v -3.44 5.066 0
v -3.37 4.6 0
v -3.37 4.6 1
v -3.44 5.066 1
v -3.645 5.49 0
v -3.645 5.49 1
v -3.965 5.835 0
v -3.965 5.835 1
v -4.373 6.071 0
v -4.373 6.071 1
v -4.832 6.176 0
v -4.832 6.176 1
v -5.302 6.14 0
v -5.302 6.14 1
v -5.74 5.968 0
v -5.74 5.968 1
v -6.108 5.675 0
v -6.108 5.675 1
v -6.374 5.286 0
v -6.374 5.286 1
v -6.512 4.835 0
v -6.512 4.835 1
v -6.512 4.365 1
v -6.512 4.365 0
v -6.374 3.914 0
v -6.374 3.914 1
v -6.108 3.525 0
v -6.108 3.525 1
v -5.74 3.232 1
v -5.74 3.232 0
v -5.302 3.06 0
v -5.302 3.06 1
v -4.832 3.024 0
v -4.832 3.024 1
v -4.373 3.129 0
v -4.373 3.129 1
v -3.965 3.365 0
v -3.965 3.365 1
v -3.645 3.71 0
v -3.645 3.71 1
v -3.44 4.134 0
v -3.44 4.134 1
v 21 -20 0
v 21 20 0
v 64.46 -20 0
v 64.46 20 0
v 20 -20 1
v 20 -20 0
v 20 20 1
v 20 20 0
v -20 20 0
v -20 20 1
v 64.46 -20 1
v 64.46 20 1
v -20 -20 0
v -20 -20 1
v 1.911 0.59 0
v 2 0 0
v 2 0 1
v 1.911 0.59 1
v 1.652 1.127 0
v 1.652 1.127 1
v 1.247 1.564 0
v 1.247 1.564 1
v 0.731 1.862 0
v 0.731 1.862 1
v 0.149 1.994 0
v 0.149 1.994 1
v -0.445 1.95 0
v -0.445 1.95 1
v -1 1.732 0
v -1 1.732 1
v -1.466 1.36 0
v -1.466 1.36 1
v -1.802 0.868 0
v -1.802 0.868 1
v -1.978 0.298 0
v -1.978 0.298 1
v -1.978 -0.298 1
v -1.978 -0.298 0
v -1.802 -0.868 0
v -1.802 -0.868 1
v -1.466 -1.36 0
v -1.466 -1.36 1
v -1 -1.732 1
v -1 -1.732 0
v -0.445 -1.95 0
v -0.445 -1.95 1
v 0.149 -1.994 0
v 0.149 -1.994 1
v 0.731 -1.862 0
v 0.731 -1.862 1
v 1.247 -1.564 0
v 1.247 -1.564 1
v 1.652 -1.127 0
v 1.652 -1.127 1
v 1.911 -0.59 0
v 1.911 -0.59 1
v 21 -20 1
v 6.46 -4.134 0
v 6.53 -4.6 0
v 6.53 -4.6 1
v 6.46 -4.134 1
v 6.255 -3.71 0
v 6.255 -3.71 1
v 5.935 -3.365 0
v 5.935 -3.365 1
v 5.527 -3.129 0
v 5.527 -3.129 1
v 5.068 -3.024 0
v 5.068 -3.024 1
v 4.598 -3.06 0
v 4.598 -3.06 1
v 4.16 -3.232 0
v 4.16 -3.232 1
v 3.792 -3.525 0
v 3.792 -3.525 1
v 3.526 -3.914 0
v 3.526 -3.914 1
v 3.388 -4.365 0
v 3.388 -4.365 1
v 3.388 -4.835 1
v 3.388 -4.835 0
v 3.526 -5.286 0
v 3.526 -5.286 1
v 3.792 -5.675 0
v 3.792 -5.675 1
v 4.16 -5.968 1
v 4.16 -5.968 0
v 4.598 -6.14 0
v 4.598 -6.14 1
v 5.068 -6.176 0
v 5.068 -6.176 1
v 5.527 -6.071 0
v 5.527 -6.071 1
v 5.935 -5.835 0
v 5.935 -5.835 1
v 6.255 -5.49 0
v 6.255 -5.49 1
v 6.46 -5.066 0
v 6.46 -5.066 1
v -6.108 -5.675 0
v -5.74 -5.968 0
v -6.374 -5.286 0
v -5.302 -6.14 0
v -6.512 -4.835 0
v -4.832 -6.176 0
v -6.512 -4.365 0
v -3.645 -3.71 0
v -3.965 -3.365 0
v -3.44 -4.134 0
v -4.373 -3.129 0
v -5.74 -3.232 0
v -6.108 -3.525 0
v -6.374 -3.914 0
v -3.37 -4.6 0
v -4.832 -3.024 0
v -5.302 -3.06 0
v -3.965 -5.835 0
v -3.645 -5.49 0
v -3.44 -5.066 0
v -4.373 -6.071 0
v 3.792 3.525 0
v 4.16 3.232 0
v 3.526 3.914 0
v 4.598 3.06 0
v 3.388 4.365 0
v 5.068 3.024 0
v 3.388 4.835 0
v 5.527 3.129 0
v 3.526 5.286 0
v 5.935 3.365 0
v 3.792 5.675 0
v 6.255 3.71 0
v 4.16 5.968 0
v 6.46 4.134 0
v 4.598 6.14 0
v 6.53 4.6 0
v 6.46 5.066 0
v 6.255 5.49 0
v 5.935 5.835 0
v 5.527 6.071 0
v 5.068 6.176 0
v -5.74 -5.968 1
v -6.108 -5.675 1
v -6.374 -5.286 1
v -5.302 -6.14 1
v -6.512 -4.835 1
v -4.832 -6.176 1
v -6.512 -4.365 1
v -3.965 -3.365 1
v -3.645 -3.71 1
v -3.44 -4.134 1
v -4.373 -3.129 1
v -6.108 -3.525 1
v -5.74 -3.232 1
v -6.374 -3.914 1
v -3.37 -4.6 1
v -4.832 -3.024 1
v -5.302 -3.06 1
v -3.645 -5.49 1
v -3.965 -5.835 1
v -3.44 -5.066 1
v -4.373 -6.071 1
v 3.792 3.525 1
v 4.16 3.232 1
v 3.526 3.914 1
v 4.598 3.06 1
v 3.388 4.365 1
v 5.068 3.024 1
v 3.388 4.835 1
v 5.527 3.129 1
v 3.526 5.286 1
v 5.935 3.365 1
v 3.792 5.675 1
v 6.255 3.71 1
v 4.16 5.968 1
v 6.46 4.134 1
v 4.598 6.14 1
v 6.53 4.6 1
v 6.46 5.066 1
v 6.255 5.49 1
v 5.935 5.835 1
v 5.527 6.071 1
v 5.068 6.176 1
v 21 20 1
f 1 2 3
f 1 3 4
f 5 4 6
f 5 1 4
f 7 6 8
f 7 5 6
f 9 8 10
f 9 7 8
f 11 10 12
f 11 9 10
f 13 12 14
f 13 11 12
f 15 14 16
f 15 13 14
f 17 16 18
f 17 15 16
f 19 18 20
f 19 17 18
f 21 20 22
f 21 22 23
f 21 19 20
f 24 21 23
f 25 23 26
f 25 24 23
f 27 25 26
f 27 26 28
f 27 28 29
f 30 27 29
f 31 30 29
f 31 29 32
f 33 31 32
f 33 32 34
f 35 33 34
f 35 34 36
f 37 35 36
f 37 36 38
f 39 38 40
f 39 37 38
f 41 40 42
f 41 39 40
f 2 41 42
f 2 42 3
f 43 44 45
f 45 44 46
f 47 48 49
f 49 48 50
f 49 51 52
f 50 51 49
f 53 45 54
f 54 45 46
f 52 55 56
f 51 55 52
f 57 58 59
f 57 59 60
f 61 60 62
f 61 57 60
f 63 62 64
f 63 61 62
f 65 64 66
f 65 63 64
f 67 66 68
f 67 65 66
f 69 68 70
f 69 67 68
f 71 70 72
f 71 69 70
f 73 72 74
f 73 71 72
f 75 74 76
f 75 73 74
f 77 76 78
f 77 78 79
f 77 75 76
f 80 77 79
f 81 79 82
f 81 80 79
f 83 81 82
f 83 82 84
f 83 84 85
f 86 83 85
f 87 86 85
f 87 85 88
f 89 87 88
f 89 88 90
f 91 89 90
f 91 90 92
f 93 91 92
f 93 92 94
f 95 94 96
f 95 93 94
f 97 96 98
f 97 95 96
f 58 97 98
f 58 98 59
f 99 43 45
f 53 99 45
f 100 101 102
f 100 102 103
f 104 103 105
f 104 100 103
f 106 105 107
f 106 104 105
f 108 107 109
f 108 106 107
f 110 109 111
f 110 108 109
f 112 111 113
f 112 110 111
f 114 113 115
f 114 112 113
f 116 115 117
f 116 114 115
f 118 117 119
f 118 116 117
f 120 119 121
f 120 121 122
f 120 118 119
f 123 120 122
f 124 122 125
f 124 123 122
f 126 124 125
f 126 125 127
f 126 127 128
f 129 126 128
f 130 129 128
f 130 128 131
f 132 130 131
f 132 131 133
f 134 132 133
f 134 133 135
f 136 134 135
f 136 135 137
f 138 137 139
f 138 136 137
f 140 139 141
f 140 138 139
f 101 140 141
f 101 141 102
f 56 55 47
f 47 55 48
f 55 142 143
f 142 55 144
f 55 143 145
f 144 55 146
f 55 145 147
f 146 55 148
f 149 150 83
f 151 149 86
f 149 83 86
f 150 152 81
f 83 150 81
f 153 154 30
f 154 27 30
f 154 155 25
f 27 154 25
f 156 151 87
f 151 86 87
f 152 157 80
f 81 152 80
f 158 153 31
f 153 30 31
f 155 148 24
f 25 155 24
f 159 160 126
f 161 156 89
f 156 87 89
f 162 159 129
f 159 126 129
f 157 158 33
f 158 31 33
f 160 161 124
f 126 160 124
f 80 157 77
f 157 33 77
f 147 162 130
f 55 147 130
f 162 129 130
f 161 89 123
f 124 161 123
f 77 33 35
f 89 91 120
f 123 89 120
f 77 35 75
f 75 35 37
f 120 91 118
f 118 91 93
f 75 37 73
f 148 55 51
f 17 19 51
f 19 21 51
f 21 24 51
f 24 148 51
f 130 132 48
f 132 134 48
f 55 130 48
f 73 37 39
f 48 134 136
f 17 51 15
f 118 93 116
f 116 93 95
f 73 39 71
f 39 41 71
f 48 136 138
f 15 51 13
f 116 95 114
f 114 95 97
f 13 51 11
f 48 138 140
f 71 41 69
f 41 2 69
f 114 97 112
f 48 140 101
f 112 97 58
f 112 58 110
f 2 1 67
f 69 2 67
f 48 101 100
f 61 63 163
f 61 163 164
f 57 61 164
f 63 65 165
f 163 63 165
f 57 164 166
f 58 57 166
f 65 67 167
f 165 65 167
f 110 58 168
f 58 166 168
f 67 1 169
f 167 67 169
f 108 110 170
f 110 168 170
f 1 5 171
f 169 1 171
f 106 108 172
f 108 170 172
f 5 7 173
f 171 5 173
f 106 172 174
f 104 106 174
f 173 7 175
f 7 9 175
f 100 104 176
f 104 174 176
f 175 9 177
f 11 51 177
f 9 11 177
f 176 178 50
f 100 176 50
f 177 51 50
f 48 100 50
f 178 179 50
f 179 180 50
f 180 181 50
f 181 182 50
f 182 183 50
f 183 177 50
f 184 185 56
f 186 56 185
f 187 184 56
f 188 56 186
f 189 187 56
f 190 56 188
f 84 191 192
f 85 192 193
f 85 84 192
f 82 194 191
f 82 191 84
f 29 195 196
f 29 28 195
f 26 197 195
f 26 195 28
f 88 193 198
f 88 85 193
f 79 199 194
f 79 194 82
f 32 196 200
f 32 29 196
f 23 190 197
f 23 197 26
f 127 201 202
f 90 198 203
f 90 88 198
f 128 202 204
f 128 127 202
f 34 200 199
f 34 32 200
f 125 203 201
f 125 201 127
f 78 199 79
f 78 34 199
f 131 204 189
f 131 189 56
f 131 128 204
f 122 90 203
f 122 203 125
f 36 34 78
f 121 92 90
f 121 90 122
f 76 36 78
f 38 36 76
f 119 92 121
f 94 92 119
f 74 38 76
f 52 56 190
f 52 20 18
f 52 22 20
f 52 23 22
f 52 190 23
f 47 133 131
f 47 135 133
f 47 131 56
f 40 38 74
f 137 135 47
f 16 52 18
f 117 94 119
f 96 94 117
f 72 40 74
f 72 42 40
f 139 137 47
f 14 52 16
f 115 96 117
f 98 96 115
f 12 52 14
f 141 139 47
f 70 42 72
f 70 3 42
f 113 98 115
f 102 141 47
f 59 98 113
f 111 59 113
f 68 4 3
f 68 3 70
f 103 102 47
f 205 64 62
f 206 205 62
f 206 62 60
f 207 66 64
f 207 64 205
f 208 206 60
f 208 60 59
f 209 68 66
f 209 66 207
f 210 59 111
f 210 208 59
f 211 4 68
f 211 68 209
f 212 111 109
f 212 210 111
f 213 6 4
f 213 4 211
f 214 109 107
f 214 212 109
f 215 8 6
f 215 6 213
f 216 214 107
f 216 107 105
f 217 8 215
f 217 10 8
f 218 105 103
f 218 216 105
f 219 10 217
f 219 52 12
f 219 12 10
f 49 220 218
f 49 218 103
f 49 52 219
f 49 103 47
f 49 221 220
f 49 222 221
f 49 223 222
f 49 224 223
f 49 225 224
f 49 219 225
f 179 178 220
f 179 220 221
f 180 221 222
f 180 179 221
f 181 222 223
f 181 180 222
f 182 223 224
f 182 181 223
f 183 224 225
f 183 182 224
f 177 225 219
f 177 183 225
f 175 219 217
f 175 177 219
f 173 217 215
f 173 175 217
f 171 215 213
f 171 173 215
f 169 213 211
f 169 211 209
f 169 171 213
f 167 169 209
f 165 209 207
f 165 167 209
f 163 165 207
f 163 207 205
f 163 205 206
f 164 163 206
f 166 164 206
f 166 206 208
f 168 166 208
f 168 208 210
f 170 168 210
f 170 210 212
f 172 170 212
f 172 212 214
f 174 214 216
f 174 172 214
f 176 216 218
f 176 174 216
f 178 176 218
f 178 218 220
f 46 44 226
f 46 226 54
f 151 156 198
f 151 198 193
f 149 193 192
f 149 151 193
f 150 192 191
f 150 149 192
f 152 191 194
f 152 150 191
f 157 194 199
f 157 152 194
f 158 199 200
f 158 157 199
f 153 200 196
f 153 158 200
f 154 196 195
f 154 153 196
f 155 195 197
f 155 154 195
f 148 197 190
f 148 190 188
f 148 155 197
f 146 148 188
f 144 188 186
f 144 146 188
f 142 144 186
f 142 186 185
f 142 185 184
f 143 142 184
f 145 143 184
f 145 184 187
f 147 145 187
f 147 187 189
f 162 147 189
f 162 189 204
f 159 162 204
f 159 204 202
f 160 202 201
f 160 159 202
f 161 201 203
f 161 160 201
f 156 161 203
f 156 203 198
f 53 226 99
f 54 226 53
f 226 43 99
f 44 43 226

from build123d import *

# Parameters (mm, degrees)
BOX001_W          = 43.46
BOX001_H          = 40
BOX001_DEPTH      = 1
CYLINDER004_R     = 2
CYLINDER004_DEPTH = 1
CYLINDER003_R     = 1.58
CYLINDER003_DEPTH = 1
CYLINDER_R        = 1.58
CYLINDER_DEPTH    = 1
CYLINDER001_R     = 1.58
CYLINDER001_DEPTH = 1
CYLINDER002_R     = 1.58
CYLINDER002_DEPTH = 1
BOX_W             = 40
BOX_H             = 40
BOX_DEPTH         = 1


with BuildPart() as cube001:
    # Box001 → Box001 (new body)
    with BuildSketch(Plane(origin=(21, -20, 0), x_dir=(1, 0, 0), z_dir=(0, 0, 1))):
        with Locations((21.73, 20)):
            Rectangle(BOX001_W, BOX001_H)
    extrude(amount=BOX001_DEPTH)


with BuildPart() as cylinder004:
    # Cylinder004 → Cylinder004 (new body)
    with BuildSketch(Plane.XY):
        Circle(CYLINDER004_R)
    extrude(amount=CYLINDER004_DEPTH)


with BuildPart() as cylinder003:
    # Cylinder003 → Cylinder003 (new body)
    with BuildSketch(Plane(origin=(4.95, -4.6, 0), x_dir=(1, 0, 0), z_dir=(0, 0, 1))):
        Circle(CYLINDER003_R)
    extrude(amount=CYLINDER003_DEPTH)


with BuildPart() as cylinder:
    # Cylinder → Cylinder (new body)
    with BuildSketch(Plane(origin=(-4.95, -4.6, 0), x_dir=(1, 0, 0), z_dir=(0, 0, 1))):
        Circle(CYLINDER_R)
    extrude(amount=CYLINDER_DEPTH)


with BuildPart() as cylinder001:
    # Cylinder001 → Cylinder001 (new body)
    with BuildSketch(Plane(origin=(-4.95, 4.6, 0), x_dir=(1, 0, 0), z_dir=(0, 0, 1))):
        Circle(CYLINDER001_R)
    extrude(amount=CYLINDER001_DEPTH)


with BuildPart() as cylinder002:
    # Cylinder002 → Cylinder002 (new body)
    with BuildSketch(Plane(origin=(4.95, 4.6, 0), x_dir=(1, 0, 0), z_dir=(0, 0, 1))):
        Circle(CYLINDER002_R)
    extrude(amount=CYLINDER002_DEPTH)


with BuildPart() as cut004:
    # Box → Box (new body)
    with BuildSketch(Plane(origin=(-20, -20, 0), x_dir=(1, 0, 0), z_dir=(0, 0, 1))):
        with Locations((20, 20)):
            Rectangle(BOX_W, BOX_H)
    extrude(amount=BOX_DEPTH)

    # Cut: cut Cylinder002
    add(cylinder002.part, mode=Mode.SUBTRACT)

    # Cut001: cut Cylinder001
    add(cylinder001.part, mode=Mode.SUBTRACT)

    # Cut002: cut Cylinder
    add(cylinder.part, mode=Mode.SUBTRACT)

    # Cut003: cut Cylinder003
    add(cylinder003.part, mode=Mode.SUBTRACT)

    # Cut004: cut Cylinder004
    add(cylinder004.part, mode=Mode.SUBTRACT)


solid = Compound([cube001.part, cut004.part])
